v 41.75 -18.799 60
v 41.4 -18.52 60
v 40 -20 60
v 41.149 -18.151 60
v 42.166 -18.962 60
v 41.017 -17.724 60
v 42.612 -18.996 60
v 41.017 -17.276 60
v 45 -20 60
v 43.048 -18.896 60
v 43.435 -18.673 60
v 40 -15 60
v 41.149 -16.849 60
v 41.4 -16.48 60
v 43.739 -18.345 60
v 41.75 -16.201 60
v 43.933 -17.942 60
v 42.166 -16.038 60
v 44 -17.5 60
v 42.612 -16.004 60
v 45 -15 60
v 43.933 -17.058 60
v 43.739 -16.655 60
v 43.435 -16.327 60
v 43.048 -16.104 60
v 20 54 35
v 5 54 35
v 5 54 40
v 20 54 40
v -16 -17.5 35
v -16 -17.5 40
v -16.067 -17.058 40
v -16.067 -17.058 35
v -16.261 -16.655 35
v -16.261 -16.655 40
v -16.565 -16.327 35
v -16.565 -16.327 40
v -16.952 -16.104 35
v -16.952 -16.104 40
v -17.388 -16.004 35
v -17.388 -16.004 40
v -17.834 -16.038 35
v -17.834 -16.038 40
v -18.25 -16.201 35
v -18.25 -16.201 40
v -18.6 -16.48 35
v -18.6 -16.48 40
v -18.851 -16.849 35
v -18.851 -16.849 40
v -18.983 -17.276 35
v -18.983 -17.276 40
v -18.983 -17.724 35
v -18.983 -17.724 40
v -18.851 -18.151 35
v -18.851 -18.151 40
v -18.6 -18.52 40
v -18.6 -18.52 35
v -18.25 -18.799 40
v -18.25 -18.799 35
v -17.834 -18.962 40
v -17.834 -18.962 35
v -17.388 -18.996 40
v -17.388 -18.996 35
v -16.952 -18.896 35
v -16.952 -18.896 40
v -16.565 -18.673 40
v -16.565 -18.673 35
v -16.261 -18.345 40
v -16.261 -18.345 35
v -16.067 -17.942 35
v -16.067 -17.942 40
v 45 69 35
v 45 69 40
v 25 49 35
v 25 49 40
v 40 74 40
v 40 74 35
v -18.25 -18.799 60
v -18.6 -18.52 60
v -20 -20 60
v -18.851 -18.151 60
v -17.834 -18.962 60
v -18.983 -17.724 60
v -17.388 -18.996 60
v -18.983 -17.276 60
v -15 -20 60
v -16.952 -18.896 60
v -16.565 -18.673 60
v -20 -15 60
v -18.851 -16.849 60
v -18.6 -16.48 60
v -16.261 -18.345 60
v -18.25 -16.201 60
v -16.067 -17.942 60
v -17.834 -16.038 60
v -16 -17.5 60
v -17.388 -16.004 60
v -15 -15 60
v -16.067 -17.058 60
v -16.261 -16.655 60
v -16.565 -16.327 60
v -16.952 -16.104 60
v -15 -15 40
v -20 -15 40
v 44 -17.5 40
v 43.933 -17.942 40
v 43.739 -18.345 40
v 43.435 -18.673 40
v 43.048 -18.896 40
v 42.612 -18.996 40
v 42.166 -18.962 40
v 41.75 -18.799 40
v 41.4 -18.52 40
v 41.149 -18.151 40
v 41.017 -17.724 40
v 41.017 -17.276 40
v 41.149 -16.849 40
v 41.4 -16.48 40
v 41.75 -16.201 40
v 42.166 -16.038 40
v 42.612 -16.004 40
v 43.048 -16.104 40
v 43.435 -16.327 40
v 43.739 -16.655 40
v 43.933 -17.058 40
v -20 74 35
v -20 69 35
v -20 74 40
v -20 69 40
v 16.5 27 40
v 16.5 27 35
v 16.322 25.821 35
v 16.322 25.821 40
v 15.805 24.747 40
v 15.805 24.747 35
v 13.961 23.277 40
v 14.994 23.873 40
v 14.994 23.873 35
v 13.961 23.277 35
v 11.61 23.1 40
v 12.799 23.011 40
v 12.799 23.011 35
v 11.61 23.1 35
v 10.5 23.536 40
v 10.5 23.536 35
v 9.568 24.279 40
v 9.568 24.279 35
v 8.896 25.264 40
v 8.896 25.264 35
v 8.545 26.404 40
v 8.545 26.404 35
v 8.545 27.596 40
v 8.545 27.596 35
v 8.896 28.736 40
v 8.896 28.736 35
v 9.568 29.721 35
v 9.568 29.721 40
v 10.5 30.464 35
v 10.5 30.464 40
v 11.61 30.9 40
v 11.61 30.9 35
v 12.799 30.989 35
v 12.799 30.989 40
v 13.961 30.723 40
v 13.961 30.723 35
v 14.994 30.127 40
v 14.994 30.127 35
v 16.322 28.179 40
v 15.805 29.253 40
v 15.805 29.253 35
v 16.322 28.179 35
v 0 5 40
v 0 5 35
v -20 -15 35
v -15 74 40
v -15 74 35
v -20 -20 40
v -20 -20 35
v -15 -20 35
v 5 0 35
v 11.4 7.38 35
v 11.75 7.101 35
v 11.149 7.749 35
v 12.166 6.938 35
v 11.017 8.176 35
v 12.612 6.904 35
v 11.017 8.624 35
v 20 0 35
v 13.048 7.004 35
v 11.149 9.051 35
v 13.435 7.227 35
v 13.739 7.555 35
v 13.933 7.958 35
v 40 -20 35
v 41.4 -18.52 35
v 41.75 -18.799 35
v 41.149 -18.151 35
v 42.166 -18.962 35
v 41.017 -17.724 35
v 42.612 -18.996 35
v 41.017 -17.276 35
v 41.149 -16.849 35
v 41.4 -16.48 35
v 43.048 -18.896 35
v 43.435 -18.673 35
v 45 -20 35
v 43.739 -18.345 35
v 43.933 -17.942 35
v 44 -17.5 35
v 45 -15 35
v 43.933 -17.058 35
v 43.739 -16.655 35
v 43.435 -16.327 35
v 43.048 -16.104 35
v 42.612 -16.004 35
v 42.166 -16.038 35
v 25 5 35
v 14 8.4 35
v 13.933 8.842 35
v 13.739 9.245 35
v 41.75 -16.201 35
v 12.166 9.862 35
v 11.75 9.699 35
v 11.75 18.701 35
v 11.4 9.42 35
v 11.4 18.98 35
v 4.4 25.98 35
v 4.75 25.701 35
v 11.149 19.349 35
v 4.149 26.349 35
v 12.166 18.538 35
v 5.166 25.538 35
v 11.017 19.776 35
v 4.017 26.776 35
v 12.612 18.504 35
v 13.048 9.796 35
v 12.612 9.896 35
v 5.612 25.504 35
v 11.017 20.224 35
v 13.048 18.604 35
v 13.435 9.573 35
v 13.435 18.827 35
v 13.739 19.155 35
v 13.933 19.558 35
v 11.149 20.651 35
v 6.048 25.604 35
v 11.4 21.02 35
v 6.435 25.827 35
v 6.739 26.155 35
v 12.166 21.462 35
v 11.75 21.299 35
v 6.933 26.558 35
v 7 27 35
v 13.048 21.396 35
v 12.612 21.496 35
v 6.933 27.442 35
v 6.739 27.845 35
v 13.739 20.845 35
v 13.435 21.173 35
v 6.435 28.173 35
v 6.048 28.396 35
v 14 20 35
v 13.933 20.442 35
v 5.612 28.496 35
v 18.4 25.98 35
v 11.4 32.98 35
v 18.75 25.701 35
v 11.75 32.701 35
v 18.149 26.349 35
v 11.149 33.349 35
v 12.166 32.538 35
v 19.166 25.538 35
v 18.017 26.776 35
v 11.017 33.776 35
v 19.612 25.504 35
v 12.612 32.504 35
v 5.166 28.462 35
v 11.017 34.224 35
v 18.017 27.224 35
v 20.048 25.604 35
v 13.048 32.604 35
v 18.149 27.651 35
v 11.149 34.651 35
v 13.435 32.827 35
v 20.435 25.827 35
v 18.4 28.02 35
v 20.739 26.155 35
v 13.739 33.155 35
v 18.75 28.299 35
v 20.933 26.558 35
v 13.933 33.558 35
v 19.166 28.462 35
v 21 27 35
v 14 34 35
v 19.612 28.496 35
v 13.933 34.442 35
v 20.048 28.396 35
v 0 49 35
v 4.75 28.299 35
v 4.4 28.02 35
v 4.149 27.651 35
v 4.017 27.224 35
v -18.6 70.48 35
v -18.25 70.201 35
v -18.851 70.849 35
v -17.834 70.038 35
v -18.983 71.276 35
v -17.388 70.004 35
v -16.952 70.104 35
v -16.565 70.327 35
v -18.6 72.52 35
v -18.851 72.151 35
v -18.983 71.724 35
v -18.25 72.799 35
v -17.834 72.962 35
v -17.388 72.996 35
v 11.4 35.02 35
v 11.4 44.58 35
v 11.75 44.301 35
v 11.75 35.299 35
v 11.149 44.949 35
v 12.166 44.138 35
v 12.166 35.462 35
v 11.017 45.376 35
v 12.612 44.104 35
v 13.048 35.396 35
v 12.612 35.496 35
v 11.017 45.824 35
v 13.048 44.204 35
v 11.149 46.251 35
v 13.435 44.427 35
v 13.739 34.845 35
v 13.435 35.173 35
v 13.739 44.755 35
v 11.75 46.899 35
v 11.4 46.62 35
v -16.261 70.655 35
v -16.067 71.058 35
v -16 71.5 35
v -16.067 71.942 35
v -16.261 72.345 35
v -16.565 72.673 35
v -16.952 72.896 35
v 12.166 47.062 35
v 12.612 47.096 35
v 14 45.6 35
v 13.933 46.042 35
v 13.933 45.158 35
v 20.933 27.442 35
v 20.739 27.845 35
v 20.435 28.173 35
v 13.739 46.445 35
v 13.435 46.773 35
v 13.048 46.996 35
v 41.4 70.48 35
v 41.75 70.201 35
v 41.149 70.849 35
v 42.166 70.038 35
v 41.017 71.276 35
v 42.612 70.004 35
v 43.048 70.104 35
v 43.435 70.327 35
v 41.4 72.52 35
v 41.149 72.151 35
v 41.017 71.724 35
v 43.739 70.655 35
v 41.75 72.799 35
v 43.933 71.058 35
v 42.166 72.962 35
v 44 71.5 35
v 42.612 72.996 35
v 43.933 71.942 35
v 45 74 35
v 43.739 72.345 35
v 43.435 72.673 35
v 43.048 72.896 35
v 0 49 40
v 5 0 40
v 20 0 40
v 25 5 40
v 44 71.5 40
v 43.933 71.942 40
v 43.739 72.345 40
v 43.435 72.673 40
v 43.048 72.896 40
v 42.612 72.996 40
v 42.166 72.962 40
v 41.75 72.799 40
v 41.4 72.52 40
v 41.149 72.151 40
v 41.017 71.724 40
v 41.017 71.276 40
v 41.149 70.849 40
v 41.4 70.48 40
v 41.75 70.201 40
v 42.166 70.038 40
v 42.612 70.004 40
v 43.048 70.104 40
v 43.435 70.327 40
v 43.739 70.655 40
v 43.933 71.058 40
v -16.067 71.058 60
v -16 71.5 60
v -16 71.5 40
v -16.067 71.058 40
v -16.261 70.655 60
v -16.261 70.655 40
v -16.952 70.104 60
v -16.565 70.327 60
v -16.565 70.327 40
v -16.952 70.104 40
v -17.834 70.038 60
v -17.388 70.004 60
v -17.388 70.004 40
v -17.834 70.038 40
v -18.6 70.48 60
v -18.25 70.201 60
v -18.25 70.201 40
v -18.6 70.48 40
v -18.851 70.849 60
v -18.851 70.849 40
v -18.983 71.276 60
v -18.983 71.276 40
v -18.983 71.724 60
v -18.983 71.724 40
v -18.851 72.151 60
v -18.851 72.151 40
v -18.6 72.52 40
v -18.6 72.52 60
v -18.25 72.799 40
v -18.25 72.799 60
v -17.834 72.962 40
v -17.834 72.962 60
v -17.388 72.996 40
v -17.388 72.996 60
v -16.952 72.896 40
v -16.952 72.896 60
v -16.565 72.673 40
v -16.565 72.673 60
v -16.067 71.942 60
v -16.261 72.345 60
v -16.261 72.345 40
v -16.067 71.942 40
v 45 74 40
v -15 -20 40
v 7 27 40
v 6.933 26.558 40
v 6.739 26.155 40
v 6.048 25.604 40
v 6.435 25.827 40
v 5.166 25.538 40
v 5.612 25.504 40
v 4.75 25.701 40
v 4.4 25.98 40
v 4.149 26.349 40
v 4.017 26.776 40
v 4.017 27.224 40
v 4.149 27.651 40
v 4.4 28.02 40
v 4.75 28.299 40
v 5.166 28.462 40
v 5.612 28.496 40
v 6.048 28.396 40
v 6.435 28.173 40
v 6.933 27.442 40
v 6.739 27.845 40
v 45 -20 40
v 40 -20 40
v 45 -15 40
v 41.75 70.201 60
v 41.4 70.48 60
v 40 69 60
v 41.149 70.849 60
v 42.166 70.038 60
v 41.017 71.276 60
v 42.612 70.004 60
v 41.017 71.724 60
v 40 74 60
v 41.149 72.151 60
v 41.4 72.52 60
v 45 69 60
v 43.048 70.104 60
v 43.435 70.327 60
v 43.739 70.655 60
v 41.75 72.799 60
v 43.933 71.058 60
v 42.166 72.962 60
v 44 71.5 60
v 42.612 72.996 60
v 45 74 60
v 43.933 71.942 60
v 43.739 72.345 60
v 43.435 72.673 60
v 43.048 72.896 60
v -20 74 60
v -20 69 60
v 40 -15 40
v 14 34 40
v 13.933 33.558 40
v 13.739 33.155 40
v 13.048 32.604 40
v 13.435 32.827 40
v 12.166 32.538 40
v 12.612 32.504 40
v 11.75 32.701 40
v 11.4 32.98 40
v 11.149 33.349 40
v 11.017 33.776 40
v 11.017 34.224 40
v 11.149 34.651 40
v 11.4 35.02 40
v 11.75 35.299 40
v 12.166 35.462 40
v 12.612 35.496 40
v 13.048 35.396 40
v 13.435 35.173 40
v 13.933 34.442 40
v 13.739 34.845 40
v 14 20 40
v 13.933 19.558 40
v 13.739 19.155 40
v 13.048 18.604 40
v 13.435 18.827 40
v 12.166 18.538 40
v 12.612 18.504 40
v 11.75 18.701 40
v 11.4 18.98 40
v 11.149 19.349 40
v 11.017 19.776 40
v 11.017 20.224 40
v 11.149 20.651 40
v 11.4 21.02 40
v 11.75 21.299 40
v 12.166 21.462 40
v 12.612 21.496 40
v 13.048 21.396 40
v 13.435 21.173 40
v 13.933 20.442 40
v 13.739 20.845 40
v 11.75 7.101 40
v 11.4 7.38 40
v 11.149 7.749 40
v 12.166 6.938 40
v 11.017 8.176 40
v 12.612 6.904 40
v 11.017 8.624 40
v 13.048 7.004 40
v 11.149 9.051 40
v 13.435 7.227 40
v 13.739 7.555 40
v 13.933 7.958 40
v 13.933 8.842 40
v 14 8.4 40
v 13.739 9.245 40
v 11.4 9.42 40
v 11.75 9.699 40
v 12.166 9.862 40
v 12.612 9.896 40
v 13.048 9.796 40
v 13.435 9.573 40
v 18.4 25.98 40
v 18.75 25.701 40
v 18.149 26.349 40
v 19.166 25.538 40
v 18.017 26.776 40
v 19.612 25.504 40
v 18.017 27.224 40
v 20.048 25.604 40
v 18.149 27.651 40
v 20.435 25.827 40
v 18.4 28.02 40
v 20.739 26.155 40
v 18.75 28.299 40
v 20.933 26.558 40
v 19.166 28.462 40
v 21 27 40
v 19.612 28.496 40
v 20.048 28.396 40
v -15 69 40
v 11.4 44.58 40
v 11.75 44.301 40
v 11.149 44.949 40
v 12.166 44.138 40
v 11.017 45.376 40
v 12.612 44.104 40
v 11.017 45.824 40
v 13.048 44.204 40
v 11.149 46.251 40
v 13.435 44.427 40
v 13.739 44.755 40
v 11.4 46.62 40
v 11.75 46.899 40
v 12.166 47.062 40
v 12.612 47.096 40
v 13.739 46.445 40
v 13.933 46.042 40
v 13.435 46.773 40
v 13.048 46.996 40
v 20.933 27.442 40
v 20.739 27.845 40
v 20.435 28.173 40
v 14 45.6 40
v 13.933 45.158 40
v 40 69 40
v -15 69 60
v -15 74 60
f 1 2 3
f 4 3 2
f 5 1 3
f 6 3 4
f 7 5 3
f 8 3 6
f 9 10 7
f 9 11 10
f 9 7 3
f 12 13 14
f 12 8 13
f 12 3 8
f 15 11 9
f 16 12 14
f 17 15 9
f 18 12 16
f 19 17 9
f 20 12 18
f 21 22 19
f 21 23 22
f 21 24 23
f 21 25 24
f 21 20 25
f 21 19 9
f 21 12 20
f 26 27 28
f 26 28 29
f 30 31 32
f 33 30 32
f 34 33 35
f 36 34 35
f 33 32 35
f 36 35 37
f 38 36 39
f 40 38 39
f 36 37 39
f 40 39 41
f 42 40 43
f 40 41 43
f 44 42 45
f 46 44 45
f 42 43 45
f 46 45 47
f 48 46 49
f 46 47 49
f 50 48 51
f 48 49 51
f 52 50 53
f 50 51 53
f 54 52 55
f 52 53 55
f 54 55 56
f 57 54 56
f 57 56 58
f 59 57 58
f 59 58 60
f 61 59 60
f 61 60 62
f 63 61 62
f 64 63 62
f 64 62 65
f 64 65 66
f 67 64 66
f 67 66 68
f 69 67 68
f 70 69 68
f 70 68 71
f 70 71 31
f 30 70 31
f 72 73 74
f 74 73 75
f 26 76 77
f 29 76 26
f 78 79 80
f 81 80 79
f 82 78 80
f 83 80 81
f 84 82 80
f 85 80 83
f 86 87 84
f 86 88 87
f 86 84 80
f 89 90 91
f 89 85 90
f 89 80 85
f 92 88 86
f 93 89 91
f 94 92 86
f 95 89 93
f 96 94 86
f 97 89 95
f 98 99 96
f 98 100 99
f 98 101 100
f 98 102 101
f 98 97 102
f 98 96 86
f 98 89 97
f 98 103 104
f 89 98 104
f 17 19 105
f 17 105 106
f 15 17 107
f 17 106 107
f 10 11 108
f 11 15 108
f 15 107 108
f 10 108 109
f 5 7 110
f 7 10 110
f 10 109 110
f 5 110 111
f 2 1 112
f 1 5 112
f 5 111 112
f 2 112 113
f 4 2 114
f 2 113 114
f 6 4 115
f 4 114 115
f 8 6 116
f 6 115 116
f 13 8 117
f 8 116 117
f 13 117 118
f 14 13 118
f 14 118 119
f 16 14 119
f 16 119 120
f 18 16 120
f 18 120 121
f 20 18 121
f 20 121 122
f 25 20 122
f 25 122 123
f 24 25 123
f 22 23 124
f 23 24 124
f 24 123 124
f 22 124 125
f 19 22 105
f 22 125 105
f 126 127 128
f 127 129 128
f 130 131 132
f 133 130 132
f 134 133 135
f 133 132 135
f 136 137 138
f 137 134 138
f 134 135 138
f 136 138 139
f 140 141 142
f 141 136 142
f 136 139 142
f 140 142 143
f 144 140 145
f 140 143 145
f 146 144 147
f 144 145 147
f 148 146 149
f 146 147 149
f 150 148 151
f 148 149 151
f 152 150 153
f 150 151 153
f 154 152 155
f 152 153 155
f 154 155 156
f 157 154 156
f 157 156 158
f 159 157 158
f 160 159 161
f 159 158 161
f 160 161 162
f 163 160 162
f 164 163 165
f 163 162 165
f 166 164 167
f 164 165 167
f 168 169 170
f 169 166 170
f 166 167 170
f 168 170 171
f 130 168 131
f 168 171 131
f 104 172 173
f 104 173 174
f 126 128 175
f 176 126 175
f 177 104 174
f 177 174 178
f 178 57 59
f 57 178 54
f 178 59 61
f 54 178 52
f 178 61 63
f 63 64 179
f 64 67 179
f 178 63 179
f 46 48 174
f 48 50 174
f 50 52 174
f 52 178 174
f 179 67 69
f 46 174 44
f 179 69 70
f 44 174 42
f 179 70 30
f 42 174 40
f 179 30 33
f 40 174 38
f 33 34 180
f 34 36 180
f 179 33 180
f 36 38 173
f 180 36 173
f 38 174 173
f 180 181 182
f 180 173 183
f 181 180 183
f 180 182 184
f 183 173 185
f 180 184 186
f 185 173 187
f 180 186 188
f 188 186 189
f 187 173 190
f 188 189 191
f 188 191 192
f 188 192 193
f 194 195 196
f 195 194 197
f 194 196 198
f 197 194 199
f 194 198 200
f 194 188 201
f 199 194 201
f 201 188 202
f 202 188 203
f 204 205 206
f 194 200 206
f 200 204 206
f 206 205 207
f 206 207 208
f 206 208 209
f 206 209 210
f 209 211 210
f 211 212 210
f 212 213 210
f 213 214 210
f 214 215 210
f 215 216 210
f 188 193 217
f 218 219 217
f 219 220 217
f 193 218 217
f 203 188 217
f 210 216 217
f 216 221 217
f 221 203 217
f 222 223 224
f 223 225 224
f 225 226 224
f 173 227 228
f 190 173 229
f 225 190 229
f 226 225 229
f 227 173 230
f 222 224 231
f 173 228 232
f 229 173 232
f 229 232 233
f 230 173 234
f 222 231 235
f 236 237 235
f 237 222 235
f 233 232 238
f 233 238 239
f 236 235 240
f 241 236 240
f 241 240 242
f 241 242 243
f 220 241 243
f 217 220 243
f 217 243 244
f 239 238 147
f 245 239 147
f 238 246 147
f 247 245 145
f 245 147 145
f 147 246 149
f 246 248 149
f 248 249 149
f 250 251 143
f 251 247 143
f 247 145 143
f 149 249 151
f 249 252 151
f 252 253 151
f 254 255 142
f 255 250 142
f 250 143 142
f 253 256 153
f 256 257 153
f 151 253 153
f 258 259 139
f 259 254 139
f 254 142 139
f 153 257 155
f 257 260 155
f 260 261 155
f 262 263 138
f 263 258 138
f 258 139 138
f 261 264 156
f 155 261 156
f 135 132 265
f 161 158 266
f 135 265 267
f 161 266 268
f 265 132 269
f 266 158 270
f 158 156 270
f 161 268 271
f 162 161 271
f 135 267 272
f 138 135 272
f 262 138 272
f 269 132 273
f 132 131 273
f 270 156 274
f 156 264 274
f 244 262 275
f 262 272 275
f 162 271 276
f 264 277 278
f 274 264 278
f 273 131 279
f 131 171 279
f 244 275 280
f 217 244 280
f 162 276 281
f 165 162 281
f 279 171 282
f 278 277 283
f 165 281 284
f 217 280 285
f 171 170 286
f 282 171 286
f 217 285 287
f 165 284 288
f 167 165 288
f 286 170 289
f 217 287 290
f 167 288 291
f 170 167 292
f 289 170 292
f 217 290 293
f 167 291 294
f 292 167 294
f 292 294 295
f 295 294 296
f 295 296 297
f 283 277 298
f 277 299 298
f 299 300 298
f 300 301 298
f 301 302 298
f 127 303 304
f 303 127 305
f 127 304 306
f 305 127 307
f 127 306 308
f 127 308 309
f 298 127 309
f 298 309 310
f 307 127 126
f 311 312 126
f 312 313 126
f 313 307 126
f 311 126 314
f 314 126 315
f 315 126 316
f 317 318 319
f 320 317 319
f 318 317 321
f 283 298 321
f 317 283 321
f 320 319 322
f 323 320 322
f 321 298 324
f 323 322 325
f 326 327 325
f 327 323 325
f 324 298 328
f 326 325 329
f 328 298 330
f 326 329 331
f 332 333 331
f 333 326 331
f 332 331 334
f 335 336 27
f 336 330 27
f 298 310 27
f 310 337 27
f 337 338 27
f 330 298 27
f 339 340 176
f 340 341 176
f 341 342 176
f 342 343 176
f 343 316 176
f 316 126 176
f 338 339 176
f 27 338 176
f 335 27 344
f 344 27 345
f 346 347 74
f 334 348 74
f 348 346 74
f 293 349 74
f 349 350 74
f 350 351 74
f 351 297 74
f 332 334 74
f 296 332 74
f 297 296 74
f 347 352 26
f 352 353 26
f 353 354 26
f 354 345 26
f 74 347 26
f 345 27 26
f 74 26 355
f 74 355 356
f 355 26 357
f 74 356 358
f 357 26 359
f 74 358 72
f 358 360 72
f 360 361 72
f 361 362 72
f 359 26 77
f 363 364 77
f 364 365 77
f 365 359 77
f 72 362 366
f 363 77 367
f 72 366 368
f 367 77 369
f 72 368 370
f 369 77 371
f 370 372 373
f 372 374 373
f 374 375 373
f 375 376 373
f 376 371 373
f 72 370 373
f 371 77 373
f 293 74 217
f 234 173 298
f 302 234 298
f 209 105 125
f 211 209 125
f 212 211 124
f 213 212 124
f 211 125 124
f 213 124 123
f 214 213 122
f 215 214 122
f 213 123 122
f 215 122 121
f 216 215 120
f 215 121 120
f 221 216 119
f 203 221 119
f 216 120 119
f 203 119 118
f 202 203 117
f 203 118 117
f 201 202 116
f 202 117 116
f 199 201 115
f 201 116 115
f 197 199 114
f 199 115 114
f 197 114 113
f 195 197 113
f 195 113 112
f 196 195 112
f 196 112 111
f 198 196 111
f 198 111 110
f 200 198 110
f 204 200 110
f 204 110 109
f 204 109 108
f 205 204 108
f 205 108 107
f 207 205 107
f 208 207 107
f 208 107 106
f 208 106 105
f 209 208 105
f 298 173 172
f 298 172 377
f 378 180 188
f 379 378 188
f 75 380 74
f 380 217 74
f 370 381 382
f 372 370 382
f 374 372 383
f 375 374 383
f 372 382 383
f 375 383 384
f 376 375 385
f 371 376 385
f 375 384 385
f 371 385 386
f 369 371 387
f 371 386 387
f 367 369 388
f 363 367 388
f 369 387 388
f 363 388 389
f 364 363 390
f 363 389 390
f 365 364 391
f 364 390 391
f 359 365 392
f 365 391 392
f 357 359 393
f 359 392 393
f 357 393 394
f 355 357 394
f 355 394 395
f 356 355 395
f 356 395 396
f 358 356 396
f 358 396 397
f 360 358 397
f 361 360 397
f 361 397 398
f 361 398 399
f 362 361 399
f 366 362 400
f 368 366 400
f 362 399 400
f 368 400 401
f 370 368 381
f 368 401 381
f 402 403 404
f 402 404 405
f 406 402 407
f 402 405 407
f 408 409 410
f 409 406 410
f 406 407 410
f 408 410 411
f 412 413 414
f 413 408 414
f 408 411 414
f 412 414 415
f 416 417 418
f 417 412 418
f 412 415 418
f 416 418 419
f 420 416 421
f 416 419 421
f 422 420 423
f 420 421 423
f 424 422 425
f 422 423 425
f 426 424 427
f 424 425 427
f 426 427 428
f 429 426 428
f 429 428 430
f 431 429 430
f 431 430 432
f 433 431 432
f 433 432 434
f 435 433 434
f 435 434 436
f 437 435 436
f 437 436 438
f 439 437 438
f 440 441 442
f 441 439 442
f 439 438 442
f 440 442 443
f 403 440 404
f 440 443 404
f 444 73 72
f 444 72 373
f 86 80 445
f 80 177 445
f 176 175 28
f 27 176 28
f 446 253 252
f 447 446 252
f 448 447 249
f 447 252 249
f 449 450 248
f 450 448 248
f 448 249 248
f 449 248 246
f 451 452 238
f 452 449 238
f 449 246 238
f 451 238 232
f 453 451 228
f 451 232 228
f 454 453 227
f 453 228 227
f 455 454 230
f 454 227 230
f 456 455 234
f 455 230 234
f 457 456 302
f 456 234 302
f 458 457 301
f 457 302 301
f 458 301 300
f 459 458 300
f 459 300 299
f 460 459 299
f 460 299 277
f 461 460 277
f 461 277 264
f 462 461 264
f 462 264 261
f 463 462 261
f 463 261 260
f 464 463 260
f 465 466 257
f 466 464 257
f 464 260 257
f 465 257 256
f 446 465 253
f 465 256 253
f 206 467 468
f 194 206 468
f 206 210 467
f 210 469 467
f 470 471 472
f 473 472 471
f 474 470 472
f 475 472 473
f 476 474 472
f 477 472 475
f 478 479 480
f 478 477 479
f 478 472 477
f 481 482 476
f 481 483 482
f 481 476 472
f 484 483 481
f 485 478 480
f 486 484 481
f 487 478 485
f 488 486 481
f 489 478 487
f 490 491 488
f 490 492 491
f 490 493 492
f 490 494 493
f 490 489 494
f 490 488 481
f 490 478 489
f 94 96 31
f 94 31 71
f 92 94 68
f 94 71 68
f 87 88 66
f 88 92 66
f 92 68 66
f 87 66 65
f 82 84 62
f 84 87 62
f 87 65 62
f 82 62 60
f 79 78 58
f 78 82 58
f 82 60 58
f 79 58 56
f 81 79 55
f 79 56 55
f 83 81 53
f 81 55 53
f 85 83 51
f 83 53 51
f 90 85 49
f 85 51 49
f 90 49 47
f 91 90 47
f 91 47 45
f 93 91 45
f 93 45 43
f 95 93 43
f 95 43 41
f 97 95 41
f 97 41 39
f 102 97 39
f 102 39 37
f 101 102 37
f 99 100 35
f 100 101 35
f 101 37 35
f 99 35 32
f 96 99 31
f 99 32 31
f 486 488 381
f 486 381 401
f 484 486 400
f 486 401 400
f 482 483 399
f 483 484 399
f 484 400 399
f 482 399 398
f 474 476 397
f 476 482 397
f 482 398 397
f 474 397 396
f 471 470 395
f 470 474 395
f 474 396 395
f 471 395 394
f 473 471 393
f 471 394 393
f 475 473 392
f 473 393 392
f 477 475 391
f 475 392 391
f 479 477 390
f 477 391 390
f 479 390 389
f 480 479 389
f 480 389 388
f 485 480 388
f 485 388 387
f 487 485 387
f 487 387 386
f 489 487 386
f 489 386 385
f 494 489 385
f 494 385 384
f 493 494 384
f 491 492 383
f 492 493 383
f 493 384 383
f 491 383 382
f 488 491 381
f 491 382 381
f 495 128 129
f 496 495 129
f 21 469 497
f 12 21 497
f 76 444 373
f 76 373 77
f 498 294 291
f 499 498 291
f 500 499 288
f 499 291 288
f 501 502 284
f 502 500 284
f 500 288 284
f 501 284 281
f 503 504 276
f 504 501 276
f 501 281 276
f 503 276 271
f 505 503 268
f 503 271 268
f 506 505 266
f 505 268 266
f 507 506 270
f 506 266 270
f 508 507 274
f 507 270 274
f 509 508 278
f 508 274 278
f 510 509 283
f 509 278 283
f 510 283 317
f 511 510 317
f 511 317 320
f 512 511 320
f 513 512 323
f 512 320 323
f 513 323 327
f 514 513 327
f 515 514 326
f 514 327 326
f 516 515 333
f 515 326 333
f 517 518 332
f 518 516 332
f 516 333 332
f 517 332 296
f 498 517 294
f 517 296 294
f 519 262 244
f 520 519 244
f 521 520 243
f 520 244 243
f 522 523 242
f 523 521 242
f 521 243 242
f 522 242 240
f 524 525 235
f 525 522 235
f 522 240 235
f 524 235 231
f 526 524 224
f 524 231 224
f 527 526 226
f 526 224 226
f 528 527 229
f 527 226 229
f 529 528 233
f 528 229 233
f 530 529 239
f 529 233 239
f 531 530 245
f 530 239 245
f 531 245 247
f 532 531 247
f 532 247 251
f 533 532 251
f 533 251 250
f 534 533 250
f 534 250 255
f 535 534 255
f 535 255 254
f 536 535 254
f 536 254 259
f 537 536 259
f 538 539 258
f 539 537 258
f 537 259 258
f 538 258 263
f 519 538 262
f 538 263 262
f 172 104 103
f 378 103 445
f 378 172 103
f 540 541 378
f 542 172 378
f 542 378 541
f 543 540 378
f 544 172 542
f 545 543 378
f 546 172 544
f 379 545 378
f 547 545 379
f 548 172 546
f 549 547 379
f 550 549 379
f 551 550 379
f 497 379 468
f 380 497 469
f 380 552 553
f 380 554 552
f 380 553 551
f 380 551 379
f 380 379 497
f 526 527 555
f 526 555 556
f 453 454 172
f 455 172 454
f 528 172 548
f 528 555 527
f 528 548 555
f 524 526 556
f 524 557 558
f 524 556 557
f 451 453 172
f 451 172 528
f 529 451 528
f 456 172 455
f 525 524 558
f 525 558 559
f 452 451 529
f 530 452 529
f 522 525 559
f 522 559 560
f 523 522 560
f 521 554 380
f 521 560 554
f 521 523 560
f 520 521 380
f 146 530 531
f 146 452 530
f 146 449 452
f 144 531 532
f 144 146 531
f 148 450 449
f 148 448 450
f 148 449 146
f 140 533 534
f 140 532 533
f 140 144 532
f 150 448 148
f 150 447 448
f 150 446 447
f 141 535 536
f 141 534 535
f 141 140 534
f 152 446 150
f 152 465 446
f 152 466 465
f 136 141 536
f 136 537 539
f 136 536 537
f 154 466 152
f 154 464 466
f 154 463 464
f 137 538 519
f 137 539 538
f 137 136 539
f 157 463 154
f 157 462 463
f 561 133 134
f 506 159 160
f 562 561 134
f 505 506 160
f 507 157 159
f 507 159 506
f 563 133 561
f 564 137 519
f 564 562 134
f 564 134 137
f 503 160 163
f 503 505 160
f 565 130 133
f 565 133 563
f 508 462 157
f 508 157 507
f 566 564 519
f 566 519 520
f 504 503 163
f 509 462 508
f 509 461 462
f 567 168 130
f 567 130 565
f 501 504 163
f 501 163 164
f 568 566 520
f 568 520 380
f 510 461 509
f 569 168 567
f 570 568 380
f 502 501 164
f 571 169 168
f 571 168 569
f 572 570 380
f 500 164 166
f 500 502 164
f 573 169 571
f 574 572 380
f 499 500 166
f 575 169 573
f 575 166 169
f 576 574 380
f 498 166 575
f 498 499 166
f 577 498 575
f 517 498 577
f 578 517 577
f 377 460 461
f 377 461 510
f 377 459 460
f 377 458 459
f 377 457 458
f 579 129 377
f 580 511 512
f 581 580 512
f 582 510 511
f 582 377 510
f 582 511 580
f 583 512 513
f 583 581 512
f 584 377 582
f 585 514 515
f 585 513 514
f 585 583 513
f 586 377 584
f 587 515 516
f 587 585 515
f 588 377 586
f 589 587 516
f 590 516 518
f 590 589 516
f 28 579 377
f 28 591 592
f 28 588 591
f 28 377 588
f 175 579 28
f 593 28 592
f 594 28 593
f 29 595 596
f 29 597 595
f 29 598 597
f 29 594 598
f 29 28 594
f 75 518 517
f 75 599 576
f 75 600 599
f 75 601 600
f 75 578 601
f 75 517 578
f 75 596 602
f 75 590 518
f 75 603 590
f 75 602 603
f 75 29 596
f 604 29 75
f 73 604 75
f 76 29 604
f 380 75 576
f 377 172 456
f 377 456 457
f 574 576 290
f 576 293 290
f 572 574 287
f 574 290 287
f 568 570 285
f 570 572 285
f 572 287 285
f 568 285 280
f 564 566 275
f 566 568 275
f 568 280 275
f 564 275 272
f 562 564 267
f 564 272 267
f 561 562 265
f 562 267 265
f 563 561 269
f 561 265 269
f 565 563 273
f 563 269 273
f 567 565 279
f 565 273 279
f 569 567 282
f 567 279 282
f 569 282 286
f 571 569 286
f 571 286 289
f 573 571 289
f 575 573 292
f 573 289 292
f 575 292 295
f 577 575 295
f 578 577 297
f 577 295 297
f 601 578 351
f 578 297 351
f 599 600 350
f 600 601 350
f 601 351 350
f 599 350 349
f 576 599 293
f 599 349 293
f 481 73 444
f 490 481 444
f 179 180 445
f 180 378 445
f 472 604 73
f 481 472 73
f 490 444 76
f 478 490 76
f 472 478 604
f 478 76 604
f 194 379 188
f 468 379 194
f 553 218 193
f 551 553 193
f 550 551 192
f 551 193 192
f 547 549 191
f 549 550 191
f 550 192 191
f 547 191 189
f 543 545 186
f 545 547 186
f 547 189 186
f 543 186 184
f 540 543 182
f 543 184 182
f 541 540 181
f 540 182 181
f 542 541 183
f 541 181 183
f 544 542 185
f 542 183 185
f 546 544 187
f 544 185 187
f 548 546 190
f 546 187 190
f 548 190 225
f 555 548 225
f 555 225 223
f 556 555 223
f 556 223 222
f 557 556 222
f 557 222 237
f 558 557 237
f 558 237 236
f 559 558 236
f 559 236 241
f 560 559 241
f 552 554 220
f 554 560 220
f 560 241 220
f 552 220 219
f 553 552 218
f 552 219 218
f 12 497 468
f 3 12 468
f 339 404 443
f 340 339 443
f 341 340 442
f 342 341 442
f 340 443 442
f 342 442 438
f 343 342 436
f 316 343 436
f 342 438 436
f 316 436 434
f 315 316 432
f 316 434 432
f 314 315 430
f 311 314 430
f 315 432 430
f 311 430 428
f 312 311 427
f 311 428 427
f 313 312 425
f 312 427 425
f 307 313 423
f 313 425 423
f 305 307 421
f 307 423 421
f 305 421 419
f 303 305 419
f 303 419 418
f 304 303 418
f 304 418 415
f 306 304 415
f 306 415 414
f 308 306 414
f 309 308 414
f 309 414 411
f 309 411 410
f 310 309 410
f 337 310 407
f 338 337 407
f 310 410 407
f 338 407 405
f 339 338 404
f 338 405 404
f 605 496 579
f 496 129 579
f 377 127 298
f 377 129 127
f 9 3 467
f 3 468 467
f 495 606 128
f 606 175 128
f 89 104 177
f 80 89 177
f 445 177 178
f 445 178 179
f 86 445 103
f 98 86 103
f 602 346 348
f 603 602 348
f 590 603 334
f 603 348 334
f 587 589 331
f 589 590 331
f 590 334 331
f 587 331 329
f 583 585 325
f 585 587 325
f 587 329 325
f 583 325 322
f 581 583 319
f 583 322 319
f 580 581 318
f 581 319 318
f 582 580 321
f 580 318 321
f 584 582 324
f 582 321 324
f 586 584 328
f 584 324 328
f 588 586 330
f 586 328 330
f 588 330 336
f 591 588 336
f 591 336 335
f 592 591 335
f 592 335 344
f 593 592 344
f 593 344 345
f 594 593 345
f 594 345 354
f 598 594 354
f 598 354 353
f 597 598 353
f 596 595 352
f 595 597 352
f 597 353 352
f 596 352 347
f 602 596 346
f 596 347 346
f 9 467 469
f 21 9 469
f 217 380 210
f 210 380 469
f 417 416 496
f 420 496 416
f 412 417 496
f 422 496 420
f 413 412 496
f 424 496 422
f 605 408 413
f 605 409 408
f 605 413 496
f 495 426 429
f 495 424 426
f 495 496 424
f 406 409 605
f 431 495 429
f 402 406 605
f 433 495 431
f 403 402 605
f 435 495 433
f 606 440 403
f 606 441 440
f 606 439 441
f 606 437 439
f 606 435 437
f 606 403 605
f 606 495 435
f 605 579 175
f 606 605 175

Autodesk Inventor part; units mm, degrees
ref_plane "YZ Plane" through (0, 0, 0) normal (1, 0, 0) x (0, 1, 0)
ref_plane "XZ Plane" through (0, 0, 0) normal (0, 1, 0) x (-1, 0, 0)
ref_plane "XY Plane" through (0, 0, 0) normal (0, 0, 1) x (1, 0, 0)
ref_plane "Work Plane1" through (0, 0, 35) normal (0, 0, 1) x (1, 0, 0)
sketch "Sketch1" plane through (0, 0, 35) normal (0, 0, 1) x (1, 0, 0)
  circle A0 centre (12.5, 45.6) radius 1.5 projected
  circle A1 centre (19.5, 27) radius 1.5 projected
  circle A2 centre (5.5, 27) radius 1.5 projected
  circle A3 centre (12.5, 20) radius 1.5 projected
  circle A4 centre (12.5, 34) radius 1.5 projected
  circle A5 centre (12.5, 8.4) radius 1.5 projected
  circle A6 centre (12.5, 27) radius 4 projected
  line L0 (0, 0) -> (25, 0) projected
  line L1 (25, 0) -> (25, 54) projected
  line L2 (0, 54) -> (25, 54) projected
  line L3 (0, 0) -> (0, 54) projected
  line L4 (25, 54) -> (0, 54)
  line L5 (0, 54) -> (0, 0)
  line L6 (0, 0) -> (25, 0)
  line L7 (25, 0) -> (25, 54)
  circle A7 centre (12.5, 45.6) radius 1.5
  circle A8 centre (12.5, 27) radius 4
  circle A9 centre (19.5, 27) radius 1.5
  circle A10 centre (12.5, 34) radius 1.5
  circle A11 centre (12.5, 20) radius 1.5
  circle A12 centre (5.5, 27) radius 1.5
  circle A13 centre (12.5, 8.4) radius 1.5
extrude "Extrusion1" add sketch "Sketch1" along normal blind 5
sketch "Sketch4" plane through (0, 0, 40) normal (0, 0, 1) x (1, 0, 0)
  line L0 (25, 54) -> (0, 54) projected
  line L1 (0, 54) -> (0, 0) projected
  circle A0 centre (12.5, 45.6) radius 1.5 projected
  line L2 (25, 0) -> (25, 54) projected
  line L3 (0, 0) -> (25, 0) projected
  line L4 (25, 54) -> (45, 54)
  line L5 (45, 54) -> (45, 74)
  line L6 (45, 74) -> (25, 74)
  line L7 (25, 74) -> (25, 54)
  line L8 (0, 54) -> (-20, 54)
  line L9 (-20, 54) -> (-20, 74)
  line L10 (-20, 74) -> (0, 74)
  line L11 (0, 74) -> (0, 54)
  line L12 (25, 0) -> (45, 0)
  line L13 (45, 0) -> (45, -20)
  line L14 (45, -20) -> (25, -20)
  line L15 (25, -20) -> (25, 0)
  line L16 (0, 0) -> (-20, 0)
  line L17 (-20, 0) -> (-20, -20)
  line L18 (-20, -20) -> (0, -20)
  line L19 (0, -20) -> (0, 0)
  line L20 (-20, 74) -> (-15, 74)
  line L21 (-15, 74) -> (-15, 69)
  line L22 (-15, 69) -> (-20, 69)
  line L23 (-20, 69) -> (-20, 74)
  line L24 (45, 74) -> (40, 74)
  line L25 (40, 74) -> (40, 69)
  line L26 (40, 69) -> (45, 69)
  line L27 (45, 69) -> (45, 74)
  line L28 (45, -20) -> (40, -20)
  line L29 (40, -20) -> (40, -15)
  line L30 (40, -15) -> (45, -15)
  line L31 (45, -15) -> (45, -20)
  line L32 (-20, -20) -> (-15, -20)
  line L33 (-15, -20) -> (-15, -15)
  line L34 (-15, -15) -> (-20, -15)
  line L35 (-20, -15) -> (-20, -20)
  line L36 (0, 0) -> (5, 0)
  line L37 (5, 0) -> (5, 5)
  line L38 (5, 5) -> (0, 5)
  line L39 (0, 5) -> (0, 0)
  line L40 (25, 0) -> (20, 0)
  line L41 (20, 0) -> (20, 5)
  line L42 (20, 5) -> (25, 5)
  line L43 (25, 5) -> (25, 0)
  line L44 (25, 54) -> (20, 54)
  line L45 (20, 54) -> (20, 49)
  line L46 (20, 49) -> (25, 49)
  line L47 (25, 49) -> (25, 54)
  line L48 (0, 54) -> (5, 54)
  line L49 (5, 54) -> (5, 49)
  line L50 (5, 49) -> (0, 49)
  line L51 (0, 49) -> (0, 54)
  line L52 (0, 5) -> (-20, -15)
  line L53 (5, 0) -> (-15, -20)
  line L54 (20, 0) -> (40, -20)
  line L55 (25, 5) -> (45, -15)
  line L56 (-20, 69) -> (0, 49)
  line L57 (-15, 74) -> (5, 54)
  line L58 (40, 74) -> (20, 54)
  line L59 (45, 69) -> (25, 49)
  circle A1 centre (-17.5, 71.5) radius 1.5
  circle A2 centre (42.5, 71.5) radius 1.5
  circle A3 centre (-17.5, -17.5) radius 1.5
  circle A4 centre (42.5, -17.5) radius 1.5
  dimension "d16" = 20
  dimension "d17" = 20
  dimension "d18" = 20
  dimension "d19" = 20
  dimension "d20" = 20
  dimension "d21" = 20
  dimension "d22" = 20
  dimension "d23" = 20
  dimension "d24" = 5
  dimension "d25" = 5
  dimension "d26" = 5
  dimension "d27" = 5
  dimension "d28" = 5
  dimension "d29" = 5
  dimension "d30" = 5
  dimension "d31" = 5
  dimension "d32" = 5
  dimension "d33" = 5
  dimension "d34" = 5
  dimension "d35" = 5
  dimension "d36" = 5
  dimension "d37" = 5
  dimension "d38" = 5
  dimension "d39" = 5
  dimension "d40" = 3
extrude "Extrusion3" add sketch "Sketch4" against normal blind 5 contours L2 L46 L45 L0 | L4 L59 L2 | L7 L58 L25 L26 L59 L4 | L0 L58 L7 | L49 L50 L1 L0 | L0 L11 L57 | L55 L12 L2 | L2 L3 L41 L42 | L26 L25 L6 L5 | L1 L56 L8 | L8 L56 L22 L21 L57 L11 | L15 L54 L3 | L12 L55 L30 L29 L54 L15 | L21 L22 L9 L10 | L13 L14 L29 L30 | L38 L37 L3 L1 | L1 L16 L52 | L53 L19 L3 | L19 L53 L33 L34 L52 L16 | L34 L33 L18 L17
sketch "Sketch5" plane through (0, 0, 40) normal (0, 0, 1) x (1, 0, 0)
  line L0 (-20, -20) -> (-15, -20) projected
  line L1 (-20, -15) -> (-20, -20) projected
  circle A0 centre (-17.5, -17.5) radius 1.5 projected
  circle A1 centre (-17.5, 71.5) radius 1.5 projected
  line L2 (-20, 74) -> (-20, 69) projected
  line L3 (-15, 74) -> (-20, 74) projected
  line L4 (45, 74) -> (40, 74) projected
  line L5 (45, 69) -> (45, 74) projected
  circle A2 centre (42.5, 71.5) radius 1.5 projected
  circle A3 centre (42.5, -17.5) radius 1.5 projected
  line L6 (40, -20) -> (45, -20) projected
  line L7 (45, -20) -> (45, -15) projected
  line L8 (-20, -20) -> (-15, -20)
  line L9 (-15, -20) -> (-15, -15)
  line L10 (-15, -15) -> (-20, -15)
  line L11 (-20, -15) -> (-20, -20)
  circle A4 centre (-17.5, -17.5) radius 1.5
  circle A5 centre (-17.5, 71.5) radius 1.5
  circle A6 centre (42.5, 71.5) radius 1.5
  circle A7 centre (42.5, -17.5) radius 1.5
  line L12 (40, -20) -> (45, -20)
  line L13 (45, -20) -> (45, -15)
  line L14 (45, -15) -> (40, -15)
  line L15 (40, -15) -> (40, -20)
  line L16 (45, 74) -> (40, 74)
  line L17 (40, 74) -> (40, 69)
  line L18 (40, 69) -> (45, 69)
  line L19 (45, 69) -> (45, 74)
  line L20 (-20, 69) -> (-15, 69)
  line L21 (-15, 69) -> (-15, 74)
  line L22 (-15, 74) -> (-20, 74)
  line L23 (-20, 74) -> (-20, 69)
  point P0 (0, 0)
extrude "Extrusion4" add sketch "Sketch5" along normal blind 20
properties part number "Face"
